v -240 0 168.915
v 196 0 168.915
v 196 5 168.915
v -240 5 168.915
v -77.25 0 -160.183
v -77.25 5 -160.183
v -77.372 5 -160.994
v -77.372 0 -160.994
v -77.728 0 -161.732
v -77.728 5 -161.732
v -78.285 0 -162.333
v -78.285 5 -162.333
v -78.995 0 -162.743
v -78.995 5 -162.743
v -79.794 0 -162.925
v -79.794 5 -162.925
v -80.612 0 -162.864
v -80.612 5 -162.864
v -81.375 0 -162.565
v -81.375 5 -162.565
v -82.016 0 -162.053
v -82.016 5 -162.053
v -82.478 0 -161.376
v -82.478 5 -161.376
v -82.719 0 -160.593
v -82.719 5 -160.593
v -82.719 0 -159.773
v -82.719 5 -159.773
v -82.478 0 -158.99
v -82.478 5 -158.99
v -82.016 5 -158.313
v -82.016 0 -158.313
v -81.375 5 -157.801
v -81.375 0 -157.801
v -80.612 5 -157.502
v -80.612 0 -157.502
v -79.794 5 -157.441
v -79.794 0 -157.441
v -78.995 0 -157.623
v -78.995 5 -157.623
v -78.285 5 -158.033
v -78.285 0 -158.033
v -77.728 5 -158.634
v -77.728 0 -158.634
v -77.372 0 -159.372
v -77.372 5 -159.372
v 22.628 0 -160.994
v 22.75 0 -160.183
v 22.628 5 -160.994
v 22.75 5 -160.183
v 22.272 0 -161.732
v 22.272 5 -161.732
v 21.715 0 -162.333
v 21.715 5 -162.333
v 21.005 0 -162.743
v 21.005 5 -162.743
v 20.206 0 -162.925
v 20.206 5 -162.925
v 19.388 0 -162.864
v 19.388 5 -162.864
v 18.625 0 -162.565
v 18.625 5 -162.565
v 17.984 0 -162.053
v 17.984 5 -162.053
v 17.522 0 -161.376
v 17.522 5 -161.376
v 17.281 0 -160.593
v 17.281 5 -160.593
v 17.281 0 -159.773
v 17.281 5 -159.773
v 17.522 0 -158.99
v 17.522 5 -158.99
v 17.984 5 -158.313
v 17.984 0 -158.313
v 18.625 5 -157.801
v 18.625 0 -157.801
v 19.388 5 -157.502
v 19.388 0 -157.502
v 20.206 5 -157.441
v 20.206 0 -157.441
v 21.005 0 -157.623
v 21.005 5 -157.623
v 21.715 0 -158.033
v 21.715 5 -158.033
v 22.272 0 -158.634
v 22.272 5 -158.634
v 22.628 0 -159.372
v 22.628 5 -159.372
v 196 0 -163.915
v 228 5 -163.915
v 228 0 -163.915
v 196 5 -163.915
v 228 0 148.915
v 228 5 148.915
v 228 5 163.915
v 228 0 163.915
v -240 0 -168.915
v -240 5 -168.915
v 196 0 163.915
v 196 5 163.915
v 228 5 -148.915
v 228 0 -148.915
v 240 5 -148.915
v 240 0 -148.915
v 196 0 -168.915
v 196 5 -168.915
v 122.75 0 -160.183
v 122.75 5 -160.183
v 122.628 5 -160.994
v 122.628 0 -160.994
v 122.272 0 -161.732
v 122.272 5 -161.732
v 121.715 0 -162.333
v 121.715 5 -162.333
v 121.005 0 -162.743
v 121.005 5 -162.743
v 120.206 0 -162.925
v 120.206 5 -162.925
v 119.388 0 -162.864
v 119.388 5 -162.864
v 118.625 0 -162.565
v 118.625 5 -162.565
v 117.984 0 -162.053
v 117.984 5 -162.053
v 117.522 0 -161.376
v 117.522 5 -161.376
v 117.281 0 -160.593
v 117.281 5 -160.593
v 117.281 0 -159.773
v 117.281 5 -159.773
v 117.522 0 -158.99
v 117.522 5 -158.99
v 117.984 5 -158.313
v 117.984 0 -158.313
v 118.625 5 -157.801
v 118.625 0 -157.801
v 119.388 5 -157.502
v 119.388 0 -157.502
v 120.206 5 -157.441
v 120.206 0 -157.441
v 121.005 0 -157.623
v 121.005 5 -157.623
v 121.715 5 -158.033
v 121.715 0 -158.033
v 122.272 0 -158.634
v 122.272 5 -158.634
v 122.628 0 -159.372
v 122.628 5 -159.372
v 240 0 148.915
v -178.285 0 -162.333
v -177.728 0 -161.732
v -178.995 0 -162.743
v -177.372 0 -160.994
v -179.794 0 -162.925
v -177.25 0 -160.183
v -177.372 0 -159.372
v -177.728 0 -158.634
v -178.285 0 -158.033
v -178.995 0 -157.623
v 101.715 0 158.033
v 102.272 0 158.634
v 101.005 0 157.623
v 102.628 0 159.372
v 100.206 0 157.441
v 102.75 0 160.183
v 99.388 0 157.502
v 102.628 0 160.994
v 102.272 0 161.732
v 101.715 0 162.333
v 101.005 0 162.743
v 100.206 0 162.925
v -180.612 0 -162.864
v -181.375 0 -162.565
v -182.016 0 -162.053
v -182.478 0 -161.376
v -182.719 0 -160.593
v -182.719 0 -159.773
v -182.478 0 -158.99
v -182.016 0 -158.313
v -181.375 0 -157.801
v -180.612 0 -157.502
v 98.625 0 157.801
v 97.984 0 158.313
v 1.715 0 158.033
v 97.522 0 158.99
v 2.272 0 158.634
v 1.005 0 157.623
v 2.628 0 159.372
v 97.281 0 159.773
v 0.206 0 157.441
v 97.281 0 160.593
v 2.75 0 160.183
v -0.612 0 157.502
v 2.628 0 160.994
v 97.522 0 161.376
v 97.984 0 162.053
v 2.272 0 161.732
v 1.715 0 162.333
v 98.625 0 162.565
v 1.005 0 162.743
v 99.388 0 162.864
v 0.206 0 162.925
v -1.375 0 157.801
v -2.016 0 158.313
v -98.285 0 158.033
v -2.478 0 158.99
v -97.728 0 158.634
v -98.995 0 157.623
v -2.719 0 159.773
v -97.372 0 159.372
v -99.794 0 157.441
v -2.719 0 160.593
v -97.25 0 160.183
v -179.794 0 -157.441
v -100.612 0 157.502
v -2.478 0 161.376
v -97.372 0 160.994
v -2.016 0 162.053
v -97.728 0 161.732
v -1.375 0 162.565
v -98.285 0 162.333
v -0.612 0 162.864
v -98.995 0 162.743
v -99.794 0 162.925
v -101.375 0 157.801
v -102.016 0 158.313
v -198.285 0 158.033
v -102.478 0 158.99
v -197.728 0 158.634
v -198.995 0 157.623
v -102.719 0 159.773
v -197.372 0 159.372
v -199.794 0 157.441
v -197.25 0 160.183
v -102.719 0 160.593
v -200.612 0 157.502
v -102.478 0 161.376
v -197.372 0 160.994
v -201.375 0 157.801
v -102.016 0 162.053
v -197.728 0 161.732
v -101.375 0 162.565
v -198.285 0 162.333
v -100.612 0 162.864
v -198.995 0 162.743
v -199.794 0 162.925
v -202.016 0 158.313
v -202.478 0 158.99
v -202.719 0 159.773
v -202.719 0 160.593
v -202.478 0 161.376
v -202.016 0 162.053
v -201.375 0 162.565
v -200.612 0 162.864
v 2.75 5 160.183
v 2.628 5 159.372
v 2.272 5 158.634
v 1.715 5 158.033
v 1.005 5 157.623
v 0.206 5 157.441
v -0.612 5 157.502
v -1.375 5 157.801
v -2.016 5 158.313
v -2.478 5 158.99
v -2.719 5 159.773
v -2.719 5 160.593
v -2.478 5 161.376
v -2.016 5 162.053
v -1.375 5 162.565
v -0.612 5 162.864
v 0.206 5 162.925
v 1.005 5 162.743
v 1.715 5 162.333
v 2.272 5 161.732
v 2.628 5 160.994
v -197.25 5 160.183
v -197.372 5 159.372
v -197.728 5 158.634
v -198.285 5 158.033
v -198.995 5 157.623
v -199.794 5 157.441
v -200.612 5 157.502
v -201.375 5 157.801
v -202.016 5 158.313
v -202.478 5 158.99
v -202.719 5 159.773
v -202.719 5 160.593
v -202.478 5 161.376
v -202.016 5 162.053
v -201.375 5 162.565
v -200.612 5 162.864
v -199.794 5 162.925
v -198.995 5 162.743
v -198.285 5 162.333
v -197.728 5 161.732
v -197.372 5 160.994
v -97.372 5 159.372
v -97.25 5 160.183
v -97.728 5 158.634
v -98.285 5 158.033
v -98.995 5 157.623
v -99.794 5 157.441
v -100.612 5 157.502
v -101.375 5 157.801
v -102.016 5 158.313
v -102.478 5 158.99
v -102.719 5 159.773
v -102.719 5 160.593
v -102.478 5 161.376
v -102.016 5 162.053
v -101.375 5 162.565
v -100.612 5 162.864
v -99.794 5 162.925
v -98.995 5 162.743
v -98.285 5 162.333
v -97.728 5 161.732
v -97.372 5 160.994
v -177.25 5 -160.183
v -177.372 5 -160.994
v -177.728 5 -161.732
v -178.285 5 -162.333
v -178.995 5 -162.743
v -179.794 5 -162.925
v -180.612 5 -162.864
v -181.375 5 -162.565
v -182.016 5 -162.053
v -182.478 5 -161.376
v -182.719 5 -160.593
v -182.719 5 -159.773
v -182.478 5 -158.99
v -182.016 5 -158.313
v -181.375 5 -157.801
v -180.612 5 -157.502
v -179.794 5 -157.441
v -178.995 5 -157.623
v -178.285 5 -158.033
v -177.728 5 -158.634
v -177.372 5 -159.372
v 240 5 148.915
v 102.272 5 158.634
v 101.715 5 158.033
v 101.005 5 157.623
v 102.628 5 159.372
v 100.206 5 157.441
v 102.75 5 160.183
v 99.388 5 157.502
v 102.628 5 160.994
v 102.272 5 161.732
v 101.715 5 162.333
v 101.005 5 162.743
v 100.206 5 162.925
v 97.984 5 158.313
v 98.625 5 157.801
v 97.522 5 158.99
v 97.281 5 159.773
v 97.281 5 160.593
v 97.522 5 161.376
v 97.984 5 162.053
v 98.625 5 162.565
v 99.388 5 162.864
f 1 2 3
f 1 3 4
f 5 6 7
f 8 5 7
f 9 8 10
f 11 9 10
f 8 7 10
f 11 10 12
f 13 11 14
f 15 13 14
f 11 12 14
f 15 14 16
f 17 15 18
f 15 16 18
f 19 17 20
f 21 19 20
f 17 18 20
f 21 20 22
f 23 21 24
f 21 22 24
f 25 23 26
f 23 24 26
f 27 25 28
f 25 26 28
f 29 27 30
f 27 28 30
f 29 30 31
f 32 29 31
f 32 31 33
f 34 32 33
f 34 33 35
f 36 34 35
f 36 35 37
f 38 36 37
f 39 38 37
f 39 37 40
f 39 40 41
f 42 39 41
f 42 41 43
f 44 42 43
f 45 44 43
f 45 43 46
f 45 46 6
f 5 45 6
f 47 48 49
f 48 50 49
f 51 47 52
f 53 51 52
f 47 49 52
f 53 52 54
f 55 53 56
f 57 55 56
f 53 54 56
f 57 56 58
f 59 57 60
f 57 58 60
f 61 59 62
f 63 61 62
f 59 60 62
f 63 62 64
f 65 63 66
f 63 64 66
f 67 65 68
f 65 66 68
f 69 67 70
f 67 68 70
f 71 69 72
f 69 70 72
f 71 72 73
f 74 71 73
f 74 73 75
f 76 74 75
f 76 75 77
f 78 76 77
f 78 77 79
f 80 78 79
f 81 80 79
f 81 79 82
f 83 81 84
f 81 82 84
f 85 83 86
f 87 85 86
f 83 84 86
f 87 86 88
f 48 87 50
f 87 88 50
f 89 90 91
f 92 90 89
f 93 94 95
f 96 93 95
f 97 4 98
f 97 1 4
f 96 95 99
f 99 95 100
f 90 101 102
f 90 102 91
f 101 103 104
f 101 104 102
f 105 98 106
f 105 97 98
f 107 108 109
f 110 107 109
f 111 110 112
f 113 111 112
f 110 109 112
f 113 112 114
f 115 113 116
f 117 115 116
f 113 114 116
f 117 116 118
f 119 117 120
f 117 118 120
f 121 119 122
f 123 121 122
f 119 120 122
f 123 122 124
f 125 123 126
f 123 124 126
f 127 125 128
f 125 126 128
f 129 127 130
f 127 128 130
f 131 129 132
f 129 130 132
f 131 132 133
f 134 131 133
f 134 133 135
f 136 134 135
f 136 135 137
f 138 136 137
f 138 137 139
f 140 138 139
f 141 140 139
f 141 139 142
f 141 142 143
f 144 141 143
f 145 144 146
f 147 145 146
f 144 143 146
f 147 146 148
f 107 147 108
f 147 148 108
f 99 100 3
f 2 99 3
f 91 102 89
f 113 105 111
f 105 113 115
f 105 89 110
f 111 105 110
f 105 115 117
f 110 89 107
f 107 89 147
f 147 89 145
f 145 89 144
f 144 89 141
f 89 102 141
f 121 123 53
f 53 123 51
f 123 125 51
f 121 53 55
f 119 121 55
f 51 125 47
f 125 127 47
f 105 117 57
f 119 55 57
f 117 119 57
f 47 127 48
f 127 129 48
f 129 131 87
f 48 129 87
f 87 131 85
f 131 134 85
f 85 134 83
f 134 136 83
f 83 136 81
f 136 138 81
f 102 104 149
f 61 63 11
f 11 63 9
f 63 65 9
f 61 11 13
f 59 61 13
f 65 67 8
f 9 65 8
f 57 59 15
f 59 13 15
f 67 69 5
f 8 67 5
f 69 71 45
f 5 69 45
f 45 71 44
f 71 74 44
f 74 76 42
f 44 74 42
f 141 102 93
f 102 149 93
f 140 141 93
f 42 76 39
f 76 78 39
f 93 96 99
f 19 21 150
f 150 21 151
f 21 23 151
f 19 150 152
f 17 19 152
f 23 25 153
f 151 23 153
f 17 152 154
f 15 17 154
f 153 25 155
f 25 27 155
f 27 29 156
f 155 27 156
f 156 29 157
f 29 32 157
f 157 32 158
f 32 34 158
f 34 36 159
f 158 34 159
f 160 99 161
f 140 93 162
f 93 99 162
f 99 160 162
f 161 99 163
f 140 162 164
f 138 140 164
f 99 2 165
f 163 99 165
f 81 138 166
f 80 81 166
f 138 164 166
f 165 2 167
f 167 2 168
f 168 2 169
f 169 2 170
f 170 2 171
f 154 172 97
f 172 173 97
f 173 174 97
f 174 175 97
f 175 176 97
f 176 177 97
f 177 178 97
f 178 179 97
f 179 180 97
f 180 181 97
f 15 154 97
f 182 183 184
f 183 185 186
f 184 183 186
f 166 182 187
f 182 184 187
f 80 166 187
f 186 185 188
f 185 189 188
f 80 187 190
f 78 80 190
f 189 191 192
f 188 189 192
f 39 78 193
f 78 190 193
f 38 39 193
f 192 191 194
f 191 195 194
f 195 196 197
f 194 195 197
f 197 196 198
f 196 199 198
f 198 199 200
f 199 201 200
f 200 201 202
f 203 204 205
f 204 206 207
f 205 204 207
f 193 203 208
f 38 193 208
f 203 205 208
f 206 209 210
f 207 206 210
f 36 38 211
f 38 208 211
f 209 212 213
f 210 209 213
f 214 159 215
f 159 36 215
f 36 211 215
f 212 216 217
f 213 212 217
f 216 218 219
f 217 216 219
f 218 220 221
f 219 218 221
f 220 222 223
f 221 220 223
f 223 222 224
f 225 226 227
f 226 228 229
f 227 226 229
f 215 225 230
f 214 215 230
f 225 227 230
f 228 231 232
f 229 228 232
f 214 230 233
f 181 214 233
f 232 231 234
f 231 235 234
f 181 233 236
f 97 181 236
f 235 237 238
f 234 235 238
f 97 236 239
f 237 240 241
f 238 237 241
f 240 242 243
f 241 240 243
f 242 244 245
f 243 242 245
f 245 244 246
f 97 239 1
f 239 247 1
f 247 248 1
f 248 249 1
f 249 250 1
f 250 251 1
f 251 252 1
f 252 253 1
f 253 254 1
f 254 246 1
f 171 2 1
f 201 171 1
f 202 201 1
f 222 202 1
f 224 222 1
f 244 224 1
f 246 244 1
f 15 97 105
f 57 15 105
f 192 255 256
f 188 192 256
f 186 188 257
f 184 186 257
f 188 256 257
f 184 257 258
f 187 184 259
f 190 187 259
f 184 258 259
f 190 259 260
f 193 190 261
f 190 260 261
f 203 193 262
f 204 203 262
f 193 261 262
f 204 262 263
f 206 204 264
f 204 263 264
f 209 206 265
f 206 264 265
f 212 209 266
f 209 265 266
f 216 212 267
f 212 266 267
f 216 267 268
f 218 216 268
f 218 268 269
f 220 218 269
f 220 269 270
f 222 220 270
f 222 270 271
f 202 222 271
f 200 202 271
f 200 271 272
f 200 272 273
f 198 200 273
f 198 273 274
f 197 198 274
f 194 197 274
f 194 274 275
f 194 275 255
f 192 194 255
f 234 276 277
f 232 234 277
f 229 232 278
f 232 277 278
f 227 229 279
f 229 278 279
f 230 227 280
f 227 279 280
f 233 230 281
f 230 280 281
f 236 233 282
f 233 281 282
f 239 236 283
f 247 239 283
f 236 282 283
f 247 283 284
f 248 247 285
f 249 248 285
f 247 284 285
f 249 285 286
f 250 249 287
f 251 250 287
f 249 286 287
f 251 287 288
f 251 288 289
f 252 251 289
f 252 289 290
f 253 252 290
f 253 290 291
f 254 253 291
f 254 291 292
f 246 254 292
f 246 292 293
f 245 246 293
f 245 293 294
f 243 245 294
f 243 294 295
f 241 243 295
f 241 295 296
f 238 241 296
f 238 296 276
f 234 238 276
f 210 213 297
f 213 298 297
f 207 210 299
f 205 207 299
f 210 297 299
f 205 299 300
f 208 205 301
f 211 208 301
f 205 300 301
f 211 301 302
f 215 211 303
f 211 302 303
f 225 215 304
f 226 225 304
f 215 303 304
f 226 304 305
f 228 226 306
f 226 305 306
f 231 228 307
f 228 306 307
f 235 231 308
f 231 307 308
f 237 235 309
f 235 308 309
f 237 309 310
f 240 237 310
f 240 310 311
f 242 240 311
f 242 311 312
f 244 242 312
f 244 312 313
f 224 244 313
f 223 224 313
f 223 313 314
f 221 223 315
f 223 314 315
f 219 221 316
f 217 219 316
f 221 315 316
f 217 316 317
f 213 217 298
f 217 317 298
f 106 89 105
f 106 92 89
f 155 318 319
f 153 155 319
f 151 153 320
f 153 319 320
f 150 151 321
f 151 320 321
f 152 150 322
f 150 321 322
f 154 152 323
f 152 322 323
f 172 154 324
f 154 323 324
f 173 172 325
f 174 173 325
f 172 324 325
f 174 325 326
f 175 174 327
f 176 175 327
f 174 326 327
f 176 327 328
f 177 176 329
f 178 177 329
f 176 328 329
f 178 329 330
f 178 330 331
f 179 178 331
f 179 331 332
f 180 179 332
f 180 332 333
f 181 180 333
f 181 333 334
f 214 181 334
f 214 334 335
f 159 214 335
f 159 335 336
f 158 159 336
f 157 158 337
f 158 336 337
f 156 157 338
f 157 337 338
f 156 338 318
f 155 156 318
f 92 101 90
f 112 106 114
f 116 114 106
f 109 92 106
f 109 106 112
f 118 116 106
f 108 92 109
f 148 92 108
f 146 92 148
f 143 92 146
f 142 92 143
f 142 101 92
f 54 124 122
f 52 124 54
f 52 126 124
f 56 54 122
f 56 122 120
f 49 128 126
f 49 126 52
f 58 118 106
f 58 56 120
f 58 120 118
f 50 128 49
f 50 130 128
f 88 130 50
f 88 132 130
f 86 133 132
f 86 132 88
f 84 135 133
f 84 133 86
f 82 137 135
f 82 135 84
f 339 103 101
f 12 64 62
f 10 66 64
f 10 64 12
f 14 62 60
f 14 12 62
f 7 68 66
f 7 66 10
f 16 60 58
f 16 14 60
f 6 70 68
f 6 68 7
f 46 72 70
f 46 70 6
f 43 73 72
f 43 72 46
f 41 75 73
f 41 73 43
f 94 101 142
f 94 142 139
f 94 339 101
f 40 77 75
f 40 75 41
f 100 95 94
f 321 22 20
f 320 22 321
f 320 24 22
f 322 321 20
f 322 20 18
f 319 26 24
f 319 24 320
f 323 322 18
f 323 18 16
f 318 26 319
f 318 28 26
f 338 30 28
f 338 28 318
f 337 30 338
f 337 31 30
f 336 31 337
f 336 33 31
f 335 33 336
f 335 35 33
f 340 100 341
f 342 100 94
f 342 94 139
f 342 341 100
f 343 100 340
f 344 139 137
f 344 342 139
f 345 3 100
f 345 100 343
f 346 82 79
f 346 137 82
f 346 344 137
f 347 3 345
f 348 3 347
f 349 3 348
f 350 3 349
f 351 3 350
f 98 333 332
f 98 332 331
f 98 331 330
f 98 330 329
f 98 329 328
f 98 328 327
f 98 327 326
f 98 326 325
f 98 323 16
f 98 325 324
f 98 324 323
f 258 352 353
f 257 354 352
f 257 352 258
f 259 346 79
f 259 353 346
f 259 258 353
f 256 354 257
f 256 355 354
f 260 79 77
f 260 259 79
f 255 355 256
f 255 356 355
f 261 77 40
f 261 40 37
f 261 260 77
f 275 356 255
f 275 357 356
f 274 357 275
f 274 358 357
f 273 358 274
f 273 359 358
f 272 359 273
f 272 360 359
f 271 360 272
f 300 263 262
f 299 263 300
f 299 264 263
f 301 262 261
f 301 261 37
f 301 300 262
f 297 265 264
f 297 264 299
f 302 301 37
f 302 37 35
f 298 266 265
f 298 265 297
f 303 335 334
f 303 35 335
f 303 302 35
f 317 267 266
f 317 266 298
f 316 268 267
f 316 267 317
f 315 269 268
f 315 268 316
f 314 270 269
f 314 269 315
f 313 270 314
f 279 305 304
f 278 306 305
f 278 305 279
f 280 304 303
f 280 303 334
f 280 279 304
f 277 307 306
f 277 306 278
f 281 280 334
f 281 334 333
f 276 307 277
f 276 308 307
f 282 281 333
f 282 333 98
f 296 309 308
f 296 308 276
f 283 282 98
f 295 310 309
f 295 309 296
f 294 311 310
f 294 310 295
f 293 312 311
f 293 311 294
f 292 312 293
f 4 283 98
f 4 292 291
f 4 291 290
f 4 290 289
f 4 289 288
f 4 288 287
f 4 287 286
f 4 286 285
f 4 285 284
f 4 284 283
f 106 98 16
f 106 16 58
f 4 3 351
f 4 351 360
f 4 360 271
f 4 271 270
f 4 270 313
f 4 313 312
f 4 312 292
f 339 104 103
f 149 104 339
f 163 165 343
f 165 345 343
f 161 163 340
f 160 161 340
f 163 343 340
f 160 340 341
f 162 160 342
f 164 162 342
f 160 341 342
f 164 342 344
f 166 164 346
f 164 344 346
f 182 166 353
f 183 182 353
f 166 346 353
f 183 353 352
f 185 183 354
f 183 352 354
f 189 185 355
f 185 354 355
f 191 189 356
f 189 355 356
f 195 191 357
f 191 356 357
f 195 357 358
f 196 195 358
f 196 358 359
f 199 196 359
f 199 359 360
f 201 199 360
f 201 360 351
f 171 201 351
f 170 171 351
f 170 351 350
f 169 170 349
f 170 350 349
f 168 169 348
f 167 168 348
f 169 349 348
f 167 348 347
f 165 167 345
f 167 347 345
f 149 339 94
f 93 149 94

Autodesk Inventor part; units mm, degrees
ref_plane "YZ Plane" through (0, 0, 0) normal (1, 0, 0) x (0, 1, 0)
ref_plane "XZ Plane" through (0, 0, 0) normal (0, 1, 0) x (-1, 0, 0)
ref_plane "XY Plane" through (0, 0, 0) normal (0, 0, 1) x (1, 0, 0)
sketch "Sketch1" plane through (0, 0, 0) normal (0, 1, 0) x (-1, 0, 0)
  line L0 (-240, 168.915) -> (240, 168.915)
  line L1 (240, 168.915) -> (240, -168.915)
  line L2 (240, -168.915) -> (-240, -168.915)
  line L3 (-240, -168.915) -> (-240, 168.915)
  line L4 (-240, 168.915) -> (240, -168.915) construction
  line L5 (240, 168.915) -> (-240, -168.915) construction
  point P0 (0, 0)
  dimension "d0" = 480
  dimension "d1" = 337.83
extrude "Extrusion1" add sketch "Sketch1" along normal blind 5
sketch "Sketch2" plane through (0, 5, 0) normal (0, 1, 0) x (1, 0, 0)
  line L0 (240, -168.915) -> (240, 168.915) projected
  line L1 (240, -168.915) -> (240, -148.915)
  line L2 (240, -148.915) -> (228, -148.915)
  line L3 (-240, -168.915) -> (240, -168.915) projected
  line L4 (228, -168.915) -> (228, -163.915)
  line L5 (228, -168.915) -> (233, -168.915) construction
  line L6 (228, -148.915) -> (228, -163.915)
  line L7 (228, -163.915) -> (196, -163.915)
  line L8 (196, -163.915) -> (196, -168.915)
  line L9 (196, -168.915) -> (240, -168.915)
  line L10 (240, 0) -> (160.3142, 0)
  line L11 (240, 168.915) -> (240, 148.915)
  line L12 (240, 148.915) -> (228, 148.915)
  line L13 (228, 168.915) -> (228, 163.915)
  line L14 (228, 168.915) -> (233, 168.915) construction
  line L15 (228, 148.915) -> (228, 163.915)
  line L16 (228, 163.915) -> (196, 163.915)
  line L17 (196, 163.915) -> (196, 168.915)
  line L18 (196, 168.915) -> (240, 168.915)
  point P0 (0, 0)
  dimension "d4" = 20
  dimension "d5" = 12
  dimension "d6" = 5
  dimension "d7" = 90
  dimension "d8" = 15
  dimension "d9" = 32
extrude "Extrusion2" cut sketch "Sketch2" against normal blind 5
sketch "Sketch4" plane through (0, 5, 0) normal (0, 1, 0) x (1, 0, 0)
  line L0 (-240, -168.915) -> (196, -168.915) projected
  line L1 (-240, -168.915) -> (-200, -168.915)
  line L2 (-200, -168.915) -> (-200, -160.183)
  circle A0 centre (-200, -160.183) radius 2.75
  circle A1 centre (-100, -160.183) radius 2.75
  circle A2 centre (0, -160.183) radius 2.75
  circle A3 centre (100, -160.183) radius 2.75
  line L3 (196, 168.915) -> (-240, 168.915) projected
  line L4 (-240, 168.915) -> (-180, 168.915)
  line L5 (-180, 168.915) -> (-180, 160.183)
  circle A4 centre (-180, 160.183) radius 2.75
  circle A5 centre (-80, 160.183) radius 2.75
  circle A6 centre (20, 160.183) radius 2.75
  circle A7 centre (120, 160.183) radius 2.75
  point P0 (0, 0)
  dimension "d14" = 40
  dimension "d15" = 8.732
  dimension "d16" = 5.5
  dimension "d19" = 100
  dimension "d24" = 60
  dimension "d25" = 8.732
  dimension "d26" = 5.5
  dimension "d29" = 100
extrude "Extrusion3" cut sketch "Sketch4" against normal blind 10
sketch "Sketch5" plane through (0, 5, 0) normal (0, 1, 0) x (1, 0, 0)
  line L0 (196, 168.915) -> (-240, 168.915) projected
  line L1 (-240, 168.915) -> (240, 168.915)
  line L2 (240, 168.915) -> (240, -170.085)
  line L3 (240, -170.085) -> (-240, -170.085)
  line L4 (-240, -170.085) -> (-240, 168.915)
  point P0 (0, 0)
  dimension "d36" = 480
  dimension "d37" = 339
sketch "Sketch6" plane through (0, 5, 0) normal (0, 1, 0) x (1, 0, 0)
  point P0 (0, 0)
properties part number "Acrylic_Panel"
